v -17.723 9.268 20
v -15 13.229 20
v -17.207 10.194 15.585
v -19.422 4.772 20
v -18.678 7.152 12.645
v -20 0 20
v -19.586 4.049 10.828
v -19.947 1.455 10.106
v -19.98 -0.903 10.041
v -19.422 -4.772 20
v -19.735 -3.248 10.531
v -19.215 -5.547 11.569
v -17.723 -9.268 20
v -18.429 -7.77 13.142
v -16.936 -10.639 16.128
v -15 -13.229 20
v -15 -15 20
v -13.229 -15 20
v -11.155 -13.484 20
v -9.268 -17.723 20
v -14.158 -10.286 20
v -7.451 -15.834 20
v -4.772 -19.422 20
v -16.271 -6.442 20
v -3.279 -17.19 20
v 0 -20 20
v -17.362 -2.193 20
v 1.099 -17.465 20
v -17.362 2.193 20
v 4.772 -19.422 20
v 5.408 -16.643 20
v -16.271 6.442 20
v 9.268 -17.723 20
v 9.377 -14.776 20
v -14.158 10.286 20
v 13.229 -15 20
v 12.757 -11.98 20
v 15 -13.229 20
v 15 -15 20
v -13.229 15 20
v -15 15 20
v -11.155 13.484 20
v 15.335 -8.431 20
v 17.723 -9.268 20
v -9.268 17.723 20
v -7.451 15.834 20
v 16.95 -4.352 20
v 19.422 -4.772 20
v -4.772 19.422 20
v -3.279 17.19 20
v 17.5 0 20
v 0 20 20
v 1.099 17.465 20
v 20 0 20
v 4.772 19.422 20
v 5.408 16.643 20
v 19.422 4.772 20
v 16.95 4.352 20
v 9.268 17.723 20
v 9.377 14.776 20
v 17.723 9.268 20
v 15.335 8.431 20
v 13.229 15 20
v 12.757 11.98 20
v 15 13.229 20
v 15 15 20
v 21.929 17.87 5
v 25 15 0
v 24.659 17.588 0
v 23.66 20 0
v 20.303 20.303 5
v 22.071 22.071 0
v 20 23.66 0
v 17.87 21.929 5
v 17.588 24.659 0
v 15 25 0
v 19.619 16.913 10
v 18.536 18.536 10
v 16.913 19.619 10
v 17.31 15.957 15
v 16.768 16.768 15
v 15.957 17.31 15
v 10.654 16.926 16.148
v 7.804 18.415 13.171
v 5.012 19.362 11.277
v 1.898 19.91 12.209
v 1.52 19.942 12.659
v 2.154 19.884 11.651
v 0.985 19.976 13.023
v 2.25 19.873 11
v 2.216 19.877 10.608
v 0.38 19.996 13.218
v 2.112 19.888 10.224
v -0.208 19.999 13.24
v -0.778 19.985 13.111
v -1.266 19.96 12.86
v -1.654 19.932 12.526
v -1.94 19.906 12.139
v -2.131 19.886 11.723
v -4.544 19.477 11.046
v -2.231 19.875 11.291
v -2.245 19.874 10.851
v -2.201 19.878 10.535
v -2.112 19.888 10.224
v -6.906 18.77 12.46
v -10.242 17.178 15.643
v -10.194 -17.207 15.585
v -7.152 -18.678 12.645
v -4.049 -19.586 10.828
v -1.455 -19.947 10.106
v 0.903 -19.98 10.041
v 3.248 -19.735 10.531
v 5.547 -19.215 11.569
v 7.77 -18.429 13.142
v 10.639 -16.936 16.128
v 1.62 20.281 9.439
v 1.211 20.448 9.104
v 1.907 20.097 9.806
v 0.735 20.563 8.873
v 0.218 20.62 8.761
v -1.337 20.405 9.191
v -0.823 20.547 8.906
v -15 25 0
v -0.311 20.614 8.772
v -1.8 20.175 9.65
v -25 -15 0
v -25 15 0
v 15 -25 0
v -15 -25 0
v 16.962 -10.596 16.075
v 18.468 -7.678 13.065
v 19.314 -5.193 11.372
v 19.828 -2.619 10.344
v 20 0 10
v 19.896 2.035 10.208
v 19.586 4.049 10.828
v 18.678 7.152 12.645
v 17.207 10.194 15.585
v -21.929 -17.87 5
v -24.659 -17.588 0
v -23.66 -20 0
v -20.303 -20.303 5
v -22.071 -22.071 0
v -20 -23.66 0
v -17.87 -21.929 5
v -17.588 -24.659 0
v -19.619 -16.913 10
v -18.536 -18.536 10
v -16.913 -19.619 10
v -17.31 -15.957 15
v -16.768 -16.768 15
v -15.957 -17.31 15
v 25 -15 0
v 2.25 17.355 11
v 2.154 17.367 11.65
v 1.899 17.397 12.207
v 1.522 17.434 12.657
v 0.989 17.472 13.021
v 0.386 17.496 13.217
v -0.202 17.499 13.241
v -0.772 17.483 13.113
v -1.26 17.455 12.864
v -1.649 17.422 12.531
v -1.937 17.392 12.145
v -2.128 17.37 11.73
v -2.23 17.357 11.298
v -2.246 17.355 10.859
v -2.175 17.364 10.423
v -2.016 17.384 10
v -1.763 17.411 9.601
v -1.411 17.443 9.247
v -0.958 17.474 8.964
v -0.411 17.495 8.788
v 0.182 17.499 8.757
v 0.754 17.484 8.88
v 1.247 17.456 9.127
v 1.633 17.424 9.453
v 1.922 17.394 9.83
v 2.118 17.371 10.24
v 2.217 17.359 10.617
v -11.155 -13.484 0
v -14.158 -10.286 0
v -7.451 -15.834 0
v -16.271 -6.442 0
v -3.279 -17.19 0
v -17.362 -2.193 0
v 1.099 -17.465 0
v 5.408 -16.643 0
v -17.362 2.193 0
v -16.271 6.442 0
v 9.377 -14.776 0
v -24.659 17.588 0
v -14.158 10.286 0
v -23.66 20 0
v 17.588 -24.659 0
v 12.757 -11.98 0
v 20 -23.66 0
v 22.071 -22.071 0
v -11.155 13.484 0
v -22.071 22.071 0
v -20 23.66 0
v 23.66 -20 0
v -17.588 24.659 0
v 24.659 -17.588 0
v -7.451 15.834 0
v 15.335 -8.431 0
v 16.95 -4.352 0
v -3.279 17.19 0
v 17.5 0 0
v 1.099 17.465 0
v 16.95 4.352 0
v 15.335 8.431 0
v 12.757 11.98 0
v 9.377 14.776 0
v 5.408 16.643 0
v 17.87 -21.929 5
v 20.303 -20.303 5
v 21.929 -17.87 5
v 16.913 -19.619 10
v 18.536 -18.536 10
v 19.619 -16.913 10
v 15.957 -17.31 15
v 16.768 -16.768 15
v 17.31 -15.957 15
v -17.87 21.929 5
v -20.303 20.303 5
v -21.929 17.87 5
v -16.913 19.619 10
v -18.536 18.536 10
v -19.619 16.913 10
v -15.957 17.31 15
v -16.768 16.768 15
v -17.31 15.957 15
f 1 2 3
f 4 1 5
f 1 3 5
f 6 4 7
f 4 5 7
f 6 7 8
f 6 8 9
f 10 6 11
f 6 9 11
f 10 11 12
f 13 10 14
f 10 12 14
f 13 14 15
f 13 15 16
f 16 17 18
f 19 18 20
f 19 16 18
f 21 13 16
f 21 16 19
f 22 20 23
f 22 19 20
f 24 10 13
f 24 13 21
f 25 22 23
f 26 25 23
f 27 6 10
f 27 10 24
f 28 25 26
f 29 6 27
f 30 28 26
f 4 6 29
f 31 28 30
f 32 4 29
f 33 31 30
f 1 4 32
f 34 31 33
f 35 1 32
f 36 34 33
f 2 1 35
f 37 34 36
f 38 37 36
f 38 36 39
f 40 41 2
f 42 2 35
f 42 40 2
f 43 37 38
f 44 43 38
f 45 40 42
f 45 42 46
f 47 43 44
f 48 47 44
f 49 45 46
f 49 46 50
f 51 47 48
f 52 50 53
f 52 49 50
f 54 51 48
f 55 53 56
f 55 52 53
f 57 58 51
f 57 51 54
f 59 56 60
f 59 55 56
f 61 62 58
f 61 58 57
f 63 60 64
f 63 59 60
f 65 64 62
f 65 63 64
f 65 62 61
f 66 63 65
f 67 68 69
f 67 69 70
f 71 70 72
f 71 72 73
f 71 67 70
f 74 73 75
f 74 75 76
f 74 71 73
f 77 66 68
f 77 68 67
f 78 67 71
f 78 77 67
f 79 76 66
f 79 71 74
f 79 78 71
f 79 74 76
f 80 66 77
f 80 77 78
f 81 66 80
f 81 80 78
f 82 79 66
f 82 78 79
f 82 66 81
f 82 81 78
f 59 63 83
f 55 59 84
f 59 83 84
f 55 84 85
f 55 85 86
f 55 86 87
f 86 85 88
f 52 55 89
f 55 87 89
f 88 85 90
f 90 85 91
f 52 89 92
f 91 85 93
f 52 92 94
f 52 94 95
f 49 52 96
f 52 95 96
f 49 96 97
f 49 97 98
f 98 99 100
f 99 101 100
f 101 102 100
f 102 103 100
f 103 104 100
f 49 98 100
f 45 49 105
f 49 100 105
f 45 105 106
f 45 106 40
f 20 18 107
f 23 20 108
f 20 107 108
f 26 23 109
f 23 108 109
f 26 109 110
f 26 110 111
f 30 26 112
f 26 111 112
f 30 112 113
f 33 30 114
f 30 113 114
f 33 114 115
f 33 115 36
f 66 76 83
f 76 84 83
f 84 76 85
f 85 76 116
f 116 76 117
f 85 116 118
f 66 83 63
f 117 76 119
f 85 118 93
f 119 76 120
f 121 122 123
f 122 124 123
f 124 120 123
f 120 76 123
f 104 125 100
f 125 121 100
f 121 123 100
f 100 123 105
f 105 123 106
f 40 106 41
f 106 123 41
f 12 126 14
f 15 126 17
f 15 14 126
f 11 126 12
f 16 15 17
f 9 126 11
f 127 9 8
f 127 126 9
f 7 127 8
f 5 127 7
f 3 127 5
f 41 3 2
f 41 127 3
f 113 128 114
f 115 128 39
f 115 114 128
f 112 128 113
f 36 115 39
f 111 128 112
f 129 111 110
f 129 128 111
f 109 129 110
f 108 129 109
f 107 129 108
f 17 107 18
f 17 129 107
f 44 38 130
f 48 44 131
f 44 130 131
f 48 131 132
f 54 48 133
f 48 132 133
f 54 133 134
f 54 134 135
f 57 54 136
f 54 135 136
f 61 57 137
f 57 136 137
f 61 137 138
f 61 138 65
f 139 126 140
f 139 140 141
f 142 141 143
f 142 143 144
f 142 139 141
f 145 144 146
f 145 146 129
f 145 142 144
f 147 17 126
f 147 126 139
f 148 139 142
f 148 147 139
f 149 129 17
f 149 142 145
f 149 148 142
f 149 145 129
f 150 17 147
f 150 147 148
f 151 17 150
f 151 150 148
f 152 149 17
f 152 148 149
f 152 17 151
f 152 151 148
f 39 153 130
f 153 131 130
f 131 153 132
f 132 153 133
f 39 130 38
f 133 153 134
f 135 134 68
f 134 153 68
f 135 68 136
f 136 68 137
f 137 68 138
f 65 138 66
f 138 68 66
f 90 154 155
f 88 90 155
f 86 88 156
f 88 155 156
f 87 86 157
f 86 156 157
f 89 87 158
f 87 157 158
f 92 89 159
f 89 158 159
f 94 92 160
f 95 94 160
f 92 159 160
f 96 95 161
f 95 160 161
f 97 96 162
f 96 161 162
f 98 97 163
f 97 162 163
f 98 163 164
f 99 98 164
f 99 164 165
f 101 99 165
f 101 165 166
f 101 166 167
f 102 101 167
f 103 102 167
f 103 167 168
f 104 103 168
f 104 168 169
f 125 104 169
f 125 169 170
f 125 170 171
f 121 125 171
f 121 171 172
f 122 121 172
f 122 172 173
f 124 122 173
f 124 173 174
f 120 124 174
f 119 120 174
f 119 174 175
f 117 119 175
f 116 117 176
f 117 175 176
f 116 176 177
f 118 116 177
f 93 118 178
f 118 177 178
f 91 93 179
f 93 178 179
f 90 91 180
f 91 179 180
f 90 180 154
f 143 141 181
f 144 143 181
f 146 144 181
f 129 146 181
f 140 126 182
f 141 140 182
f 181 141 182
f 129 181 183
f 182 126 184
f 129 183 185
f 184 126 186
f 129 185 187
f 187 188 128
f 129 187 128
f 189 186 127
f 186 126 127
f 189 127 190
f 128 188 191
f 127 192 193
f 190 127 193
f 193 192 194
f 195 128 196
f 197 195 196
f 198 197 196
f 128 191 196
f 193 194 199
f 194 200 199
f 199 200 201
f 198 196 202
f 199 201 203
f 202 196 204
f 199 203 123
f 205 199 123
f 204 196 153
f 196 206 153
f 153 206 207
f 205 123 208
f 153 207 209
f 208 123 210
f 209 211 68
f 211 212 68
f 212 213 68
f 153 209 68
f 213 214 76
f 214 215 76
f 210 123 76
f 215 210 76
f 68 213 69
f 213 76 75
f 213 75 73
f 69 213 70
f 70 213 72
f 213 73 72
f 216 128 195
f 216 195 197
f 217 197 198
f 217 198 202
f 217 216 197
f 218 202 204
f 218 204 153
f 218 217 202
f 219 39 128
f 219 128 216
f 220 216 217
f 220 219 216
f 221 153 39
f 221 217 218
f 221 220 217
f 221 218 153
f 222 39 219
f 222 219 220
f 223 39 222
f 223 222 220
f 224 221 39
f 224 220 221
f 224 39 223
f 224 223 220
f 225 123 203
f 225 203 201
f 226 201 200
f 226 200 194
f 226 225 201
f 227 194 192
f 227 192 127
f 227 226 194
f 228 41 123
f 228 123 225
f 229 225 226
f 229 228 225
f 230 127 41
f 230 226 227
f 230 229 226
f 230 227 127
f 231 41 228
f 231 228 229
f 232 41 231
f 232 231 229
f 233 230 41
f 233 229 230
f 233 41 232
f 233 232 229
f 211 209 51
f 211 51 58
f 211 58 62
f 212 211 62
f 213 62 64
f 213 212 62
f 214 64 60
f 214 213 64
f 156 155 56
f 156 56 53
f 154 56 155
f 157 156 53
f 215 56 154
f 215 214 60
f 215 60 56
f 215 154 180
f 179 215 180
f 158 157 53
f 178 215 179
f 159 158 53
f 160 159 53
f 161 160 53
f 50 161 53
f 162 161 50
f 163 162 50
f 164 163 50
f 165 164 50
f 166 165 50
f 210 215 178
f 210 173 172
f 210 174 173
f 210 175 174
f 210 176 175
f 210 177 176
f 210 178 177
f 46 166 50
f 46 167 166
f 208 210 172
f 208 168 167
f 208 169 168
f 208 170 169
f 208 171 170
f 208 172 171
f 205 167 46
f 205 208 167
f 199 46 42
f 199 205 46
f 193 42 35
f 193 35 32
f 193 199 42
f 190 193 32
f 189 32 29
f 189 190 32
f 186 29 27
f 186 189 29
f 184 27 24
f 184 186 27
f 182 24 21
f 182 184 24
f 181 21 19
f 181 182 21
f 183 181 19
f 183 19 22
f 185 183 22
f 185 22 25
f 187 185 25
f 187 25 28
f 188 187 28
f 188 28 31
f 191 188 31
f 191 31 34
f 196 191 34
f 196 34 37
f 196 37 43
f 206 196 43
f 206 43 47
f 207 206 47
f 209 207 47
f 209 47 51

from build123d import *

# Parameters (mm, degrees)
F0_R         = 20
F1_DEPTH     = 20
F2_T1_DEPTH  = 30
F2_T3_DEPTH  = 30
F2_T6_ANGLE  = 90
F2_T8_ANGLE  = 90
F2_T10_ANGLE = 90
F2_T12_ANGLE = 90
F0_R_2       = 17.5
F3_DEPTH     = 20
F4_R         = 2.25
F5_DEPTH     = 25


# Not quite as in the source:
# - a fillet or chamfer that OpenCascade refuses, or shapes differently, is made with other operations: its cross-section is extruded or revolved along the edge and cut away or added


with BuildPart() as f1:
    # F0 (on Top) → F1 (new body)
    with BuildSketch(Plane.XY):
        with BuildLine():
            ThreePointArc((25, 15), (22.0710678119, 22.0710678119), (15, 25))
            Line((15, 25), (-15, 25))
            ThreePointArc((-15, 25), (-22.0710678119, 22.0710678119), (-25, 15))
            Line((-25, 15), (-25, -15))
            ThreePointArc((-25, -15), (-22.0710678119, -22.0710678119), (-15, -25))
            Line((-15, -25), (15, -25))
            ThreePointArc((15, -25), (22.0710678119, -22.0710678119), (25, -15))
            Line((25, -15), (25, 15))
        make_face()
        Circle(F0_R, mode=Mode.SUBTRACT)
    extrude(amount=F1_DEPTH)

    # F2: chamfer of 20 x 10 on 1 edges, made by hand

    # F2_s2 → F2_t1 (cut)
    with BuildSketch(Plane.YZ.offset(-15)):
        Polygon((-25, 0), (-15, 20), (-25, 20), align=None)
        Polygon((25, 0), (15, 20), (25, 20), align=None)
    extrude(amount=F2_T1_DEPTH, mode=Mode.SUBTRACT)

    # F2_s4 → F2_t3 (cut)
    with BuildSketch(Plane.XZ.offset(-15)):
        Polygon((25, 0), (15, 20), (25, 20), align=None)
        Polygon((-25, 0), (-15, 20), (-25, 20), align=None)
    extrude(amount=F2_T3_DEPTH, mode=Mode.SUBTRACT)

    # F2_s5 → F2_t6 (revolve, cut)
    with BuildSketch(Plane.XZ.offset(15)):
        Polygon((-25, 0), (-15, 20), (-25, 20), align=None)
    revolve(axis=Axis((-15, -15, 20), (0, 0, 1)), revolution_arc=F2_T6_ANGLE, mode=Mode.SUBTRACT)

    # F2_s7 → F2_t8 (revolve, cut)
    with BuildSketch(Plane.YZ.offset(15)):
        Polygon((-25, 0), (-15, 20), (-25, 20), align=None)
    revolve(axis=Axis((15, -15, 20), (0, 0, 1)), revolution_arc=F2_T8_ANGLE, mode=Mode.SUBTRACT)

    # F2_s9 → F2_t10 (revolve, cut)
    with BuildSketch(Plane.XZ.offset(-15)):
        Polygon((25, 0), (15, 20), (25, 20), align=None)
    revolve(axis=Axis((15, 15, 20), (0, 0, 1)), revolution_arc=F2_T10_ANGLE, mode=Mode.SUBTRACT)

    # F2_s11 → F2_t12 (revolve, cut)
    with BuildSketch(Plane.YZ.offset(-15)):
        Polygon((25, 0), (15, 20), (25, 20), align=None)
    revolve(axis=Axis((-15, 15, 20), (0, 0, 1)), revolution_arc=F2_T12_ANGLE, mode=Mode.SUBTRACT)

    # F0 (on Top) → F3 (join)
    with BuildSketch(Plane.XY):
        Circle(F0_R)
        Circle(F0_R_2, mode=Mode.SUBTRACT)
    extrude(amount=F3_DEPTH)

    # F4 (on Front) → F5 (cut)
    with BuildSketch(Plane.XZ):
        with Locations((0, 11)):
            Circle(F4_R)
    extrude(amount=-F5_DEPTH, mode=Mode.SUBTRACT)


solid = f1.part
